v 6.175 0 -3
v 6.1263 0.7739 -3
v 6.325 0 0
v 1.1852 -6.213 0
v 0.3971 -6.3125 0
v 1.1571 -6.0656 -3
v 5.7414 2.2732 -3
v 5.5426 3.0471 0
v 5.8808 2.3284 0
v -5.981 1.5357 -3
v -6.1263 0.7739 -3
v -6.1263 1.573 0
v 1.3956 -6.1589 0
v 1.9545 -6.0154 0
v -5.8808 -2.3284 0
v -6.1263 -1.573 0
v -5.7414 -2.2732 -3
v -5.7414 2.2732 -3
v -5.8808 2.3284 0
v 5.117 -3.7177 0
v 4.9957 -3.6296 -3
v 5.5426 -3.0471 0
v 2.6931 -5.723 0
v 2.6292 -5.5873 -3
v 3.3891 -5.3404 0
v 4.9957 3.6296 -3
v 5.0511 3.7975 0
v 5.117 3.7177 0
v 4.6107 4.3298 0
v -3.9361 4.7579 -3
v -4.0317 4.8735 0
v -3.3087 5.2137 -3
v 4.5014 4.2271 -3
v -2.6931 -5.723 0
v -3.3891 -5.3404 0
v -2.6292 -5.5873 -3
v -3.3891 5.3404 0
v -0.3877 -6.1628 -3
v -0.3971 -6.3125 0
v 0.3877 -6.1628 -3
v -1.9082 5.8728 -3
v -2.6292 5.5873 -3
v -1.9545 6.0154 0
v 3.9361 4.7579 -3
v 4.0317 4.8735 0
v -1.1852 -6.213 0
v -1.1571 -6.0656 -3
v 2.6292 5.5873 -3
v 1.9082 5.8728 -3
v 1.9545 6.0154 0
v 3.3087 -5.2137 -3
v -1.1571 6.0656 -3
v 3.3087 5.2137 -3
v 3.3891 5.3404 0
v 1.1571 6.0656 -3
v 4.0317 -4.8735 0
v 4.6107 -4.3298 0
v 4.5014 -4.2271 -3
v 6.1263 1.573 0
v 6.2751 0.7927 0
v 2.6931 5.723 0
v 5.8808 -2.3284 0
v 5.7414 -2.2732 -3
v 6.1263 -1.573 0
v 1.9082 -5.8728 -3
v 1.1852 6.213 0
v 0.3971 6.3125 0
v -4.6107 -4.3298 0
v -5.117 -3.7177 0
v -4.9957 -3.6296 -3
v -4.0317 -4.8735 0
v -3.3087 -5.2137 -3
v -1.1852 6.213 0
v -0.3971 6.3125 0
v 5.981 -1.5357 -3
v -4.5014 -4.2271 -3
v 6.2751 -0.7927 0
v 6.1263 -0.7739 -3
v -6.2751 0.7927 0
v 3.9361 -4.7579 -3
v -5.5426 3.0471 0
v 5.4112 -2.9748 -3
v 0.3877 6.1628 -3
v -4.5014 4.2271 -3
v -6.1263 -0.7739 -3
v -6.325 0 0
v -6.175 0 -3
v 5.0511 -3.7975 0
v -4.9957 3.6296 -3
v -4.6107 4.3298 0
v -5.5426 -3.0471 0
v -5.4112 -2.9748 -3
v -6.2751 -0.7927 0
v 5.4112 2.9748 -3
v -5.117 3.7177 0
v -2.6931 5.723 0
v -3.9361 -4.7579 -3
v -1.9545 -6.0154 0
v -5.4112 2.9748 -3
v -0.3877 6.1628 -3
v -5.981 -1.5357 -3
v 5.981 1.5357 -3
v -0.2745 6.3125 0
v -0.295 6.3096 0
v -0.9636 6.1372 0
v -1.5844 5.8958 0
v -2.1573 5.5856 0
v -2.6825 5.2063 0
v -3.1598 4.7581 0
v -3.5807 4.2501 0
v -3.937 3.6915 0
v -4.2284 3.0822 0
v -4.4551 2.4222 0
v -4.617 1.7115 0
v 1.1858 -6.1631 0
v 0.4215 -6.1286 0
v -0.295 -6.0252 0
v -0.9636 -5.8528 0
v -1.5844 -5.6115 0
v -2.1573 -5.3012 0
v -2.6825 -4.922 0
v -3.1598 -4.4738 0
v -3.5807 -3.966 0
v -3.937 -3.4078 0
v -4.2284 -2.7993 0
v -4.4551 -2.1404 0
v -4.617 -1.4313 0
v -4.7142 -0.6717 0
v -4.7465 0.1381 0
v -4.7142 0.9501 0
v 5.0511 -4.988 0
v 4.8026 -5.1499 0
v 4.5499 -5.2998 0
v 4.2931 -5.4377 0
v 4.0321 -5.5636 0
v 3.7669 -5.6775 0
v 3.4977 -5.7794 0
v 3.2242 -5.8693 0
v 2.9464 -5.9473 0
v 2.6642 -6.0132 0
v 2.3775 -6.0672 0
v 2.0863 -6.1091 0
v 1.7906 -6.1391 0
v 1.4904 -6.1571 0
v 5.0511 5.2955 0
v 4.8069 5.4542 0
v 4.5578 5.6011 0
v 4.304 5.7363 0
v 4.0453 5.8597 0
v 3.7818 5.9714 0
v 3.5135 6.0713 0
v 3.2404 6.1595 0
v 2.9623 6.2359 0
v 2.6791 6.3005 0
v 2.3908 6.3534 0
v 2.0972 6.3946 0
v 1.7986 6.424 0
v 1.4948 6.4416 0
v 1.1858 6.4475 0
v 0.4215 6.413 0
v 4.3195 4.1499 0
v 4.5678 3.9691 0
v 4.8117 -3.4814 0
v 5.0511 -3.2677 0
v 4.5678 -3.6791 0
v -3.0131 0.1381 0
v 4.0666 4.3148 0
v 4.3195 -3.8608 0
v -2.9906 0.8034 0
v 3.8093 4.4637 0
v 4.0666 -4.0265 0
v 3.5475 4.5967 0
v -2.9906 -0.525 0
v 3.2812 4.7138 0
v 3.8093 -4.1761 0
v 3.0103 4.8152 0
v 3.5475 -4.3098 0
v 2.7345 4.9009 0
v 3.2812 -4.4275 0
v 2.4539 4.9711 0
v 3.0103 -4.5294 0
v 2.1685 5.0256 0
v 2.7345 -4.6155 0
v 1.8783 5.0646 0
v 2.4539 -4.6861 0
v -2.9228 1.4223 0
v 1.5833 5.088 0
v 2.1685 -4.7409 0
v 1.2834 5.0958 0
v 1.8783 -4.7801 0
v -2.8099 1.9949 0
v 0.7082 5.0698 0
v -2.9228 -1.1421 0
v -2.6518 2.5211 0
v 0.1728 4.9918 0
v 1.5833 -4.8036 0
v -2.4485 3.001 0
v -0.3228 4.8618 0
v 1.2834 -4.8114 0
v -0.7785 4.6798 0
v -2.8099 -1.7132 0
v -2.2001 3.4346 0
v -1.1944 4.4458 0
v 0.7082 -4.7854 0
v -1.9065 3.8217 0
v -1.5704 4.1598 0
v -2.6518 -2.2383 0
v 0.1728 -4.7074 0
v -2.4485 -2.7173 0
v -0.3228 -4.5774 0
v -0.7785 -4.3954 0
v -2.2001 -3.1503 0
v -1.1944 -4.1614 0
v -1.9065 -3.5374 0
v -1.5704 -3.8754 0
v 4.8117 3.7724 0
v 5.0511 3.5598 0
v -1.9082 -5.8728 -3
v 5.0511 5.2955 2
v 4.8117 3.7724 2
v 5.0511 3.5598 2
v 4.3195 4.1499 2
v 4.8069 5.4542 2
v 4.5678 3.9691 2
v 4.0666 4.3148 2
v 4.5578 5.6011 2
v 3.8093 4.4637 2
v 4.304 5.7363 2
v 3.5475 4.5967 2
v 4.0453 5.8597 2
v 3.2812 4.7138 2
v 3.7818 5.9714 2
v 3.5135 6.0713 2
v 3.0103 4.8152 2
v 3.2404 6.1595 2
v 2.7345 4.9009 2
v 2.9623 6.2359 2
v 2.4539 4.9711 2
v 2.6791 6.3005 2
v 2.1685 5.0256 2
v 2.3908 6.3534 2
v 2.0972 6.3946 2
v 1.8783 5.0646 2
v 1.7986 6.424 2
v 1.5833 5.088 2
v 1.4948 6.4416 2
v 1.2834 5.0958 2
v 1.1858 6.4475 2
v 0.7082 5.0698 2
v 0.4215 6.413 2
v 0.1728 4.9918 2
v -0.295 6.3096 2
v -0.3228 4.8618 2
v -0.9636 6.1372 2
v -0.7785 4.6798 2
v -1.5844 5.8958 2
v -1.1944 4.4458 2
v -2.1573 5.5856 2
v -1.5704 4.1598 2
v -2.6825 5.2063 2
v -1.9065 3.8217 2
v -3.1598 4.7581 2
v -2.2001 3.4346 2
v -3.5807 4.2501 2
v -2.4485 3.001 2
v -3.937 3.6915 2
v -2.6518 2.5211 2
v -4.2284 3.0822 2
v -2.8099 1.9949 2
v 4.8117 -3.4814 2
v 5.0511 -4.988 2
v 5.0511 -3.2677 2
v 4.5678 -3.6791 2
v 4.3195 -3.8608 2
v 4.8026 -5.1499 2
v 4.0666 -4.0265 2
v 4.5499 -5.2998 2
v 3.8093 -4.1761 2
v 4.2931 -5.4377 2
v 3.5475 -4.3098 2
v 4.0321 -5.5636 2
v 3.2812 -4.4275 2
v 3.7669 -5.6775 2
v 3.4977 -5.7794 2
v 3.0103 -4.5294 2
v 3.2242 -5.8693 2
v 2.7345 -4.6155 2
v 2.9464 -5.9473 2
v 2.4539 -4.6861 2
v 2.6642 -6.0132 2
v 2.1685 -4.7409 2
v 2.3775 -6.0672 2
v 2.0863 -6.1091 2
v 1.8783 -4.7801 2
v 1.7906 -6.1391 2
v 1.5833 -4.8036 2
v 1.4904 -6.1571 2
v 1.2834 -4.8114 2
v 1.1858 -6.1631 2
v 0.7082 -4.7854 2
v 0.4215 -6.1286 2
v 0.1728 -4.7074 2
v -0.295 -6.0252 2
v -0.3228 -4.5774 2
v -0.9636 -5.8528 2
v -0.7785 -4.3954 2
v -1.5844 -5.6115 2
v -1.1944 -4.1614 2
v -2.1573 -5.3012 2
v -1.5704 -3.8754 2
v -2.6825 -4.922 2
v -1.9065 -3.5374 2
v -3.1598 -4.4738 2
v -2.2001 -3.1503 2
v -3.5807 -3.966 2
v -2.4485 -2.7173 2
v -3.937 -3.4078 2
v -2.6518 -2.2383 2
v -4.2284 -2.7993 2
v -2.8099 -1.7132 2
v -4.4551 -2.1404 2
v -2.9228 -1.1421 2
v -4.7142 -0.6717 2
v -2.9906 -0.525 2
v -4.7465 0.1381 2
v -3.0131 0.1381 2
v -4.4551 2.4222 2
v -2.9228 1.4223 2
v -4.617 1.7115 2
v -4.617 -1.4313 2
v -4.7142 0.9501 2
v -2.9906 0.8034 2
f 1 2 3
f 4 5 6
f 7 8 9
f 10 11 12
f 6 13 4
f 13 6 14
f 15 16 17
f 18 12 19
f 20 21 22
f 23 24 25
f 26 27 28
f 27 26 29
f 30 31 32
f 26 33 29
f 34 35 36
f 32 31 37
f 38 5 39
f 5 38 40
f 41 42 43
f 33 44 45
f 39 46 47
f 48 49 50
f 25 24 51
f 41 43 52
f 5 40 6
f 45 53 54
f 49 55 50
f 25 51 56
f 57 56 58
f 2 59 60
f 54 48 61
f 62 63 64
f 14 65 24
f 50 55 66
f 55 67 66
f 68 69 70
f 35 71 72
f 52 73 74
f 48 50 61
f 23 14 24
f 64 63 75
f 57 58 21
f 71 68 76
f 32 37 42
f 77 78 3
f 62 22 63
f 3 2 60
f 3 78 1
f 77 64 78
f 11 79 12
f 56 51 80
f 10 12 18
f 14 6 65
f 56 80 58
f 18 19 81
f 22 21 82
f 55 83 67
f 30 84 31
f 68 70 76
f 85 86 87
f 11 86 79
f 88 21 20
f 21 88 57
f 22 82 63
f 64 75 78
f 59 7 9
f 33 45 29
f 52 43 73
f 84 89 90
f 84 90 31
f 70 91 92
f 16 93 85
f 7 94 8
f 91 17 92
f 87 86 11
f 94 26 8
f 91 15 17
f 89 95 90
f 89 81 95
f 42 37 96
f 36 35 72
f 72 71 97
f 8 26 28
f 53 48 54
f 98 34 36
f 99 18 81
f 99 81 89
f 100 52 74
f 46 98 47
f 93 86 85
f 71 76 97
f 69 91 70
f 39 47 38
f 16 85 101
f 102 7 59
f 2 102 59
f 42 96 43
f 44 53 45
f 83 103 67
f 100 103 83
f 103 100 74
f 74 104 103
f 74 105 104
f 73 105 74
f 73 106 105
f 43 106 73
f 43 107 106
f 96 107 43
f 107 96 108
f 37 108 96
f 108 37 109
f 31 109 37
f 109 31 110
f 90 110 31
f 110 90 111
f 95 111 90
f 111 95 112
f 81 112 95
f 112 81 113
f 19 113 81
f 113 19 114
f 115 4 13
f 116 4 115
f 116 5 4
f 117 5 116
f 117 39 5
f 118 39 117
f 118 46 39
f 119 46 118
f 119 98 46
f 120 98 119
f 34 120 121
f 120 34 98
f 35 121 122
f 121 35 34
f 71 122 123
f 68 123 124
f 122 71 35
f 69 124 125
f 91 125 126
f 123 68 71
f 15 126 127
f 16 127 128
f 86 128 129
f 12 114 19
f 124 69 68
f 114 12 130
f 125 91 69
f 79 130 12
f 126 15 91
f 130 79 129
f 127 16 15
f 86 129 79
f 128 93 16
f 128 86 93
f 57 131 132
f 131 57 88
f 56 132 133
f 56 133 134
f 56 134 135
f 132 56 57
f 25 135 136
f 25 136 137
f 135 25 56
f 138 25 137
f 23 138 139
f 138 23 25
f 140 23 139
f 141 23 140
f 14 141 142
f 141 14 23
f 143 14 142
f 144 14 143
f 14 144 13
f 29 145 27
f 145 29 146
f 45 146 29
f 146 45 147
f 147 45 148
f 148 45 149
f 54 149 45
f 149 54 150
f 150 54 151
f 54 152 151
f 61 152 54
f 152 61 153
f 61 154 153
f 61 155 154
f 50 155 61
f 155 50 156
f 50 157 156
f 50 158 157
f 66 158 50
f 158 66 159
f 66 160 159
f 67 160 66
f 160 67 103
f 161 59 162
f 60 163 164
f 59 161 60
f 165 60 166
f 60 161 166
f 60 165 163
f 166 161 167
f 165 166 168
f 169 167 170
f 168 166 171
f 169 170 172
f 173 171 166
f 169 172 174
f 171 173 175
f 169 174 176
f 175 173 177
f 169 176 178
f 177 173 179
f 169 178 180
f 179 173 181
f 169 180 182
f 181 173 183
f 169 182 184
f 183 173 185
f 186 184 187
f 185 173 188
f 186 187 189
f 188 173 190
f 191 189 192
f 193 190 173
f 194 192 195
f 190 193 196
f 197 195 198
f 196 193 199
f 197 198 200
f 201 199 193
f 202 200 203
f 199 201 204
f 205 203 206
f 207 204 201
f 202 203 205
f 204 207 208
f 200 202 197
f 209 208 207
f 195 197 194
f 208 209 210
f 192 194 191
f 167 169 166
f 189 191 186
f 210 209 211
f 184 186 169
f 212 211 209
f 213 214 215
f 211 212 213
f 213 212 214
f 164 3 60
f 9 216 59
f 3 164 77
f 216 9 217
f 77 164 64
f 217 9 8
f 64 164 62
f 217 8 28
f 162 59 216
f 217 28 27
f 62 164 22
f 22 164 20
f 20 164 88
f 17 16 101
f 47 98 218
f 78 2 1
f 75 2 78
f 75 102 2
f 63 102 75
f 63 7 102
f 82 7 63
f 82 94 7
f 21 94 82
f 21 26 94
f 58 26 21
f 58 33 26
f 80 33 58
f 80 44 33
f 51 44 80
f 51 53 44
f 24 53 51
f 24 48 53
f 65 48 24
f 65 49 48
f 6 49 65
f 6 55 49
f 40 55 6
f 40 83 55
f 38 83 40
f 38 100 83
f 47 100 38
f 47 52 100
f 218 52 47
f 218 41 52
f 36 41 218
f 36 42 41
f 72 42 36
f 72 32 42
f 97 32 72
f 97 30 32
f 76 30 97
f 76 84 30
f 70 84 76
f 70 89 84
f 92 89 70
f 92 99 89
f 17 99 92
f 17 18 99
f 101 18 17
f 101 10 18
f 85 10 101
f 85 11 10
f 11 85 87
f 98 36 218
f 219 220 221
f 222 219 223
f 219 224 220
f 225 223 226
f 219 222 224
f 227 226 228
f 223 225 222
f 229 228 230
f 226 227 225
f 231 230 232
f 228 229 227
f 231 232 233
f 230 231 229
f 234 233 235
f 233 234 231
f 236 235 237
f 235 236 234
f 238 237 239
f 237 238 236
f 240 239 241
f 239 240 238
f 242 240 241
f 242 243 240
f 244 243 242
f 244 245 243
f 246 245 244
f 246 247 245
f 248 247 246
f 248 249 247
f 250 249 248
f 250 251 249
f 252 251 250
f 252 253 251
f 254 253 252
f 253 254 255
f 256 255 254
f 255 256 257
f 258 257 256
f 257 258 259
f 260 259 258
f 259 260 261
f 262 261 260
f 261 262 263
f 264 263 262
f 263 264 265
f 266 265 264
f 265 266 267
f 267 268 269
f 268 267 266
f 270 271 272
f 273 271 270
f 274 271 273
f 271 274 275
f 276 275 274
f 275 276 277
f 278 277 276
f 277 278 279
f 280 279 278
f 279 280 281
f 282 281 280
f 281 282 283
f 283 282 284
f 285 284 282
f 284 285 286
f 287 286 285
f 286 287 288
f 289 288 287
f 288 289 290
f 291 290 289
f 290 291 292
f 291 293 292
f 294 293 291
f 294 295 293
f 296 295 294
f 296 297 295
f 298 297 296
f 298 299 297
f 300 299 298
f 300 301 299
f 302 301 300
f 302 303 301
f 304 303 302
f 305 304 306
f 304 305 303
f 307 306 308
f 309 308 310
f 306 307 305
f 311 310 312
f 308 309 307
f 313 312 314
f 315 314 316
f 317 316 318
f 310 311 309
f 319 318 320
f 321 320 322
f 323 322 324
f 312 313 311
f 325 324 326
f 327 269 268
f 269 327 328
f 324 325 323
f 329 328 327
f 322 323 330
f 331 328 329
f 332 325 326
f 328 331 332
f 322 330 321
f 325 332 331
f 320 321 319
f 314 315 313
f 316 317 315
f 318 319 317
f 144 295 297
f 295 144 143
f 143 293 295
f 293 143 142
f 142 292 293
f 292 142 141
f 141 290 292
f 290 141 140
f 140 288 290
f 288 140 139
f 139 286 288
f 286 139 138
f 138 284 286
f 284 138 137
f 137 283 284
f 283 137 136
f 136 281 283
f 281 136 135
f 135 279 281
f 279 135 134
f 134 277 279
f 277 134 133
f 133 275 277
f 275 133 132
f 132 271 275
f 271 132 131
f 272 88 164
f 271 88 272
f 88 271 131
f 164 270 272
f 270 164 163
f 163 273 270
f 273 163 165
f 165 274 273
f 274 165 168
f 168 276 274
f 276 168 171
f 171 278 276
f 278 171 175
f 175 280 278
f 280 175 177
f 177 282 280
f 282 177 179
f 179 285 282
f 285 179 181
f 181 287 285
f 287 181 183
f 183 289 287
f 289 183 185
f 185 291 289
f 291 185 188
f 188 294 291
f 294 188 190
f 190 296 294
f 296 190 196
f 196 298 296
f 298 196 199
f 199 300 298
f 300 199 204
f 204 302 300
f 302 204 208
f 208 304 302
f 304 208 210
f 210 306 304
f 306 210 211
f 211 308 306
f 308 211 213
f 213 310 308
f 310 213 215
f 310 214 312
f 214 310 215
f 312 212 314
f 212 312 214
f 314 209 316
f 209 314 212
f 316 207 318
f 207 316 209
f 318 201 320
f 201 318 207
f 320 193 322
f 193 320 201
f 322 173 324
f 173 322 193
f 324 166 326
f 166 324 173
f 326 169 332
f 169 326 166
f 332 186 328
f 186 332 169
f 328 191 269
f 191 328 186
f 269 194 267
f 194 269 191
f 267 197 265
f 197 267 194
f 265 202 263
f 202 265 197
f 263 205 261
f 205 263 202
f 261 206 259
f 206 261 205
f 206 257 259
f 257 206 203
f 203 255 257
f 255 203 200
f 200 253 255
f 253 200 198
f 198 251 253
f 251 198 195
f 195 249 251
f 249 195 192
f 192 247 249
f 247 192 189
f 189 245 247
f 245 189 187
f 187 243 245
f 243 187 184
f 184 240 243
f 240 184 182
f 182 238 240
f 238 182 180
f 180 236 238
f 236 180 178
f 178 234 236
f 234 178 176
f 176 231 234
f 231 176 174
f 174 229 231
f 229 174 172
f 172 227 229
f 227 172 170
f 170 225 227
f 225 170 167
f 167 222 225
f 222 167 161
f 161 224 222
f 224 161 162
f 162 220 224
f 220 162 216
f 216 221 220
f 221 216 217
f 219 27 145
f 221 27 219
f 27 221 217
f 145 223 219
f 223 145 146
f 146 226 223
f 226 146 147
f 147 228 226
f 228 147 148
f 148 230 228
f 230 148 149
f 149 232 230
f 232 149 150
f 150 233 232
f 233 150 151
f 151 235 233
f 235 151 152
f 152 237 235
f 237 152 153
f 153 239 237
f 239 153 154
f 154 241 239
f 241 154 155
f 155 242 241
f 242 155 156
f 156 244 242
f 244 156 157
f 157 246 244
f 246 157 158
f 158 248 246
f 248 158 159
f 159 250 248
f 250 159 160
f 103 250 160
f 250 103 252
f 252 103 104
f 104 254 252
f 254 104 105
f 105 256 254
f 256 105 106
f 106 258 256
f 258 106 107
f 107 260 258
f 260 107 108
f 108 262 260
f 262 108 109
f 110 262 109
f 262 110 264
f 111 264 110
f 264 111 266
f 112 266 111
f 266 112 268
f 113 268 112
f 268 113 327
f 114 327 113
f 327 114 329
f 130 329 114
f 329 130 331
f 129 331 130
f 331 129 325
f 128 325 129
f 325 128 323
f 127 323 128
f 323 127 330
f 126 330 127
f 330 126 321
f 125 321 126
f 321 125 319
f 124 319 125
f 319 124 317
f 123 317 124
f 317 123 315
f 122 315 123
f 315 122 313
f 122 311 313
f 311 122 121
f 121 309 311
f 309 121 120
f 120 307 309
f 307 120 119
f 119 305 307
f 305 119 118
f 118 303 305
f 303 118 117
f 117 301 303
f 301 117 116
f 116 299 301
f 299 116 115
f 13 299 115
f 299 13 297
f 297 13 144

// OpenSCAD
$fn = 50;

difference() {
	union() {
		translate(v = [0, 0, -3.0]) {
			cylinder(h = 3, r1 = 6.175, r2 = 6.325);
		}
		linear_extrude(height = 2) {
			text(font = "Impact", halign = "center", size = 12, text = "C", valign = "center");
		}
	}
	union();
}
